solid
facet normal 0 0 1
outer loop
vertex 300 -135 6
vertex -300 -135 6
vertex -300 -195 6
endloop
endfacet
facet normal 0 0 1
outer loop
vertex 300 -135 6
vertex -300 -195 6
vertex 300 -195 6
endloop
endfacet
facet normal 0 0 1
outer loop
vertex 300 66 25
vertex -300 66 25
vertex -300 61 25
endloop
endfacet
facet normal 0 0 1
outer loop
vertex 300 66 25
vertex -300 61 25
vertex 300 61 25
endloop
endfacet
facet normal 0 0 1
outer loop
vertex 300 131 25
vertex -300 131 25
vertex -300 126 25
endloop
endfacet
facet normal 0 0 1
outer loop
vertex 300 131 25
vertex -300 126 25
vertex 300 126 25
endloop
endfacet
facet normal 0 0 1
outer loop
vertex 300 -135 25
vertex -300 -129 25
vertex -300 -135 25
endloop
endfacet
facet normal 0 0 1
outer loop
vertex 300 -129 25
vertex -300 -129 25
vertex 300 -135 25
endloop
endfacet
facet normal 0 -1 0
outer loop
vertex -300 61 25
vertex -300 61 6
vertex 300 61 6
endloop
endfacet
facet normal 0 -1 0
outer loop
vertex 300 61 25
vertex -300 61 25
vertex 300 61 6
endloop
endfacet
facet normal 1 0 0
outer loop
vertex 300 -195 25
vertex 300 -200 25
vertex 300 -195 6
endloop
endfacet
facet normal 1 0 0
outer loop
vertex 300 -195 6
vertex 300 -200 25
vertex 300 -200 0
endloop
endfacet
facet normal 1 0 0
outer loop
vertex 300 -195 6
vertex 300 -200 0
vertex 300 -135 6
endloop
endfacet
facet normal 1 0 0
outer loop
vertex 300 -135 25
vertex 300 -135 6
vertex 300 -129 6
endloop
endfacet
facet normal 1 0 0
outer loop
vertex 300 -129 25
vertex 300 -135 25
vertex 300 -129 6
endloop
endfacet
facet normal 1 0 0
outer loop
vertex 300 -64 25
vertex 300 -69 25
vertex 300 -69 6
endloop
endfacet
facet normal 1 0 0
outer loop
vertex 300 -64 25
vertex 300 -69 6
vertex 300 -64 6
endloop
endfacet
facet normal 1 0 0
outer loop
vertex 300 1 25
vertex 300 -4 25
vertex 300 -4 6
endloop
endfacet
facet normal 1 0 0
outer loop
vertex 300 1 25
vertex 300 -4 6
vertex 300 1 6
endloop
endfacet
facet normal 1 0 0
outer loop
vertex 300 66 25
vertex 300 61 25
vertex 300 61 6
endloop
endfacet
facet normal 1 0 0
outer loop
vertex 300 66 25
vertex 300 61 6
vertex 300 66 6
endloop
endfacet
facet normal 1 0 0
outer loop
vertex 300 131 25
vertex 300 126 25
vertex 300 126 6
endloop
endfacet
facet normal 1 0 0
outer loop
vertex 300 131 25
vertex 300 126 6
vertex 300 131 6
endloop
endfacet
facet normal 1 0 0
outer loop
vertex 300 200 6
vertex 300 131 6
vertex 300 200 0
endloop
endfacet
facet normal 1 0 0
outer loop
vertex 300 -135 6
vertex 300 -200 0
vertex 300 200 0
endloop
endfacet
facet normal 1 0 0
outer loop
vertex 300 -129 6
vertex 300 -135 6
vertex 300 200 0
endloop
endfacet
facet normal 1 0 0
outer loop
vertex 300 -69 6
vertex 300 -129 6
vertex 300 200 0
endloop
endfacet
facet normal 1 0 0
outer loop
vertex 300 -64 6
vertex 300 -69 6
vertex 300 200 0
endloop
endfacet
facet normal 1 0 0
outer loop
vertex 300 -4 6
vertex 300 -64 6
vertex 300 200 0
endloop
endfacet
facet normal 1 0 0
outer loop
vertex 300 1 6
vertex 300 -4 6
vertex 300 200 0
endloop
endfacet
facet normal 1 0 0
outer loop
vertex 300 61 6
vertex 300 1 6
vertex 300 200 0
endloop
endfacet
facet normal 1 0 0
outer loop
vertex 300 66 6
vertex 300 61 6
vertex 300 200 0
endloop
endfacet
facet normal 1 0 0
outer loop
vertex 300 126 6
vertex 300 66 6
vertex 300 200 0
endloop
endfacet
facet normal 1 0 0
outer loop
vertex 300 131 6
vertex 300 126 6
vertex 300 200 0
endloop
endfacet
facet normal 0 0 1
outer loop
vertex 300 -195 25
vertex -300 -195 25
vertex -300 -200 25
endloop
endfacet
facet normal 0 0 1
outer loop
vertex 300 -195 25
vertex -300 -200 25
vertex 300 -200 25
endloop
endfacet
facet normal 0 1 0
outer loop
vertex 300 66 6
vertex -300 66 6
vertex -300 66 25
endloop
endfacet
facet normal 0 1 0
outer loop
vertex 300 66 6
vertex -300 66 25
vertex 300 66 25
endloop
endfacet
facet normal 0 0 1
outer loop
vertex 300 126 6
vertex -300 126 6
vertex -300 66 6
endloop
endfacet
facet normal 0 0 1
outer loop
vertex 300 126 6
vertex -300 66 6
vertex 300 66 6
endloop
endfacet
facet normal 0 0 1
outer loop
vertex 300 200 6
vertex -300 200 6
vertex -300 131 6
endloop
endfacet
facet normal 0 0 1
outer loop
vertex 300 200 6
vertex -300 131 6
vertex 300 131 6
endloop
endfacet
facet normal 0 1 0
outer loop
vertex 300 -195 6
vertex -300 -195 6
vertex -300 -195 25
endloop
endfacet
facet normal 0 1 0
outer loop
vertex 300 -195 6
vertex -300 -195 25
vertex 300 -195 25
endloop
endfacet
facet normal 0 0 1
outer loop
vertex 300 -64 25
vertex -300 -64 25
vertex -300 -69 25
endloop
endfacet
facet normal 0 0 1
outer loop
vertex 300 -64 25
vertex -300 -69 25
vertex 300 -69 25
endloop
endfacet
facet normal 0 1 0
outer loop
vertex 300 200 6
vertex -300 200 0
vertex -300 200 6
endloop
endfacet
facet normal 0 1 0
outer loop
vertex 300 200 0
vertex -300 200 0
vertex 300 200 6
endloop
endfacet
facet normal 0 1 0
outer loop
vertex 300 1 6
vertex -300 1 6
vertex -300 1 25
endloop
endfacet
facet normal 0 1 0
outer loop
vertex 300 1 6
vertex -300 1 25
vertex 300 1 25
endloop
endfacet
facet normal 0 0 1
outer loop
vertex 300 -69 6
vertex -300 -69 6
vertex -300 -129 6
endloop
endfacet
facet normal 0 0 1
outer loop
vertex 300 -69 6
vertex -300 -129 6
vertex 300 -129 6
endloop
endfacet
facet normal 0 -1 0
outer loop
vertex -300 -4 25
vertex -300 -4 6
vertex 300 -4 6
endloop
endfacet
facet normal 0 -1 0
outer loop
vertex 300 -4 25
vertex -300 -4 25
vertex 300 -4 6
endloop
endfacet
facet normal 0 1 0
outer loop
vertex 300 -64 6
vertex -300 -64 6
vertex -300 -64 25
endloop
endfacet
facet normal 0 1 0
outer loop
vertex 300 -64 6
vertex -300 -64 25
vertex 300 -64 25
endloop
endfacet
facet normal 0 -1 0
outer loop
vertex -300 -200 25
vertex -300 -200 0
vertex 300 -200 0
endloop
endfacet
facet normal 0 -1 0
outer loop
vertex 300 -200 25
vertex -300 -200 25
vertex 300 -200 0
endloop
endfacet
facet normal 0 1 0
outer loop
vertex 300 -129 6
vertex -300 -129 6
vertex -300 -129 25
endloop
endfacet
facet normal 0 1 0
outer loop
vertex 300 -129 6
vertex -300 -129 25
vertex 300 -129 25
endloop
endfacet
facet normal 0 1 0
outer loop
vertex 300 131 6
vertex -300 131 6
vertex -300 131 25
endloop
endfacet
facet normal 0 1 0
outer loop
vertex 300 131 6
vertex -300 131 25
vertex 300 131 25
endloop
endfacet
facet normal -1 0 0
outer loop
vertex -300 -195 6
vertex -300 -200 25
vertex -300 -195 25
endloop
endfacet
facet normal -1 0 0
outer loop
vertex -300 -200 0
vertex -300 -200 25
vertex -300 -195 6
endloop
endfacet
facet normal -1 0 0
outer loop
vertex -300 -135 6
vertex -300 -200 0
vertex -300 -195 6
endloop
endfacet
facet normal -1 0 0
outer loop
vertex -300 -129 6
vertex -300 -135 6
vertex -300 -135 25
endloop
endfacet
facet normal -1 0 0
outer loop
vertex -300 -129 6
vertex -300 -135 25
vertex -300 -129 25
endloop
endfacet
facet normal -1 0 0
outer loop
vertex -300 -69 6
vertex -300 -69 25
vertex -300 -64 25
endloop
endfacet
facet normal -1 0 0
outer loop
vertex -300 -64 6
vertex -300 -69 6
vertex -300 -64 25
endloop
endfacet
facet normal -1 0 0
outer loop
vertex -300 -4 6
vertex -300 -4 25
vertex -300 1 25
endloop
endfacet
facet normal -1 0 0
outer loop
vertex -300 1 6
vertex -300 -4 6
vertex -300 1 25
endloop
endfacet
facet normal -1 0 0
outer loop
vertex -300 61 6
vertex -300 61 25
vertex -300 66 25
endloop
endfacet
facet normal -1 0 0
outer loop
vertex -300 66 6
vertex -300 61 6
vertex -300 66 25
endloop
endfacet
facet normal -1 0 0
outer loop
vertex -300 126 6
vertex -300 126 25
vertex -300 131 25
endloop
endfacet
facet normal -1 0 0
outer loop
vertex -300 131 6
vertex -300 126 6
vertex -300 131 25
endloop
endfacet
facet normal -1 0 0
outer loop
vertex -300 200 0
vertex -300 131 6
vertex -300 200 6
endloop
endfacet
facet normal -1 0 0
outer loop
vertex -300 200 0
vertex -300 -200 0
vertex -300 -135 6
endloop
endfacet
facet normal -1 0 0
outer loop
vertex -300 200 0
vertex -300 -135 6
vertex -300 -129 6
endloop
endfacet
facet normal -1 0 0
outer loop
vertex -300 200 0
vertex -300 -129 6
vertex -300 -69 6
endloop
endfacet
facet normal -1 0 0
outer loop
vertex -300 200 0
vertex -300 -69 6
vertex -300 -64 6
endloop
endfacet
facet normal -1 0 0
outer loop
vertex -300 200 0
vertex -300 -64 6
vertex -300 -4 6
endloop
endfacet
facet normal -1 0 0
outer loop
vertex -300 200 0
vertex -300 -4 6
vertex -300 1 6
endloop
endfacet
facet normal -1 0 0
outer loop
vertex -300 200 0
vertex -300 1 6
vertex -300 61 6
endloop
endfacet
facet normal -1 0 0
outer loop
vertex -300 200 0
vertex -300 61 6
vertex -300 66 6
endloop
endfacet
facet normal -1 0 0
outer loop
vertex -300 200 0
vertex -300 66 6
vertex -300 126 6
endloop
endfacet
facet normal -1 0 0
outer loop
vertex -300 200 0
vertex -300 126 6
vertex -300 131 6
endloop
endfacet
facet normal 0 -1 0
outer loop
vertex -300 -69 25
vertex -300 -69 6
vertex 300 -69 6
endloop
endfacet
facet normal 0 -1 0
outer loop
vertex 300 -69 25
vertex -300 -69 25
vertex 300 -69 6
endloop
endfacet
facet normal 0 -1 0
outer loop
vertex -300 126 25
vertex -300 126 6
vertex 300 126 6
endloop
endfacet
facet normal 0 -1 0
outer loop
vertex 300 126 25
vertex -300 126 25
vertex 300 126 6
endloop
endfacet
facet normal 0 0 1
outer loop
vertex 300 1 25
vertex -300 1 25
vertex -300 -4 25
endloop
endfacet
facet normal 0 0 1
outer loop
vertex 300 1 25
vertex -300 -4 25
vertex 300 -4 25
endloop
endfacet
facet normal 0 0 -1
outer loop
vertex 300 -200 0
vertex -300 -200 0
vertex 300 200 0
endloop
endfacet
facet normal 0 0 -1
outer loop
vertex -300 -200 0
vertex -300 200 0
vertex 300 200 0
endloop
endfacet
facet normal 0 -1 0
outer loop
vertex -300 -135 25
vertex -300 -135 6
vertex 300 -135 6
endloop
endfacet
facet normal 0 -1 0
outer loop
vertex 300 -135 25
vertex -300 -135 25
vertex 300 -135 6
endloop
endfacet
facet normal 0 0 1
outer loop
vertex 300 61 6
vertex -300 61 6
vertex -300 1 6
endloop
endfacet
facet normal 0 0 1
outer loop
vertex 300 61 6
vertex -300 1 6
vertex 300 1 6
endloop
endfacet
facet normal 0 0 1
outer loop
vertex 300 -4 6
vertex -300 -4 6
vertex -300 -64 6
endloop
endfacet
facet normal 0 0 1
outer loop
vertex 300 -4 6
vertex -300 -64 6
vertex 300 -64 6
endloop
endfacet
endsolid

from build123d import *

# Parameters (mm, degrees)
F0_W     = 600
F0_H     = 400
F1_DEPTH = 6
F2_W     = 600
F2_H     = 6
F2_H_2   = 5
F3_DEPTH = 25


with BuildPart() as f1:
    # F0 (on Top) → F1 (new body)
    with BuildSketch(Plane.XY):
        Rectangle(F0_W, F0_H)
    extrude(amount=F1_DEPTH)

    # F2 (on Top) → F3 (join)
    with BuildSketch(Plane.XY):
        with Locations((0, -132)):
            Rectangle(F2_W, F2_H)
        with Locations((0, -66.5)):
            Rectangle(F2_W, F2_H_2)
        with Locations((0, -1.5)):
            Rectangle(F2_W, F2_H_2)
        with Locations((0, 63.5)):
            Rectangle(F2_W, F2_H_2)
        with Locations((0, 128.5)):
            Rectangle(F2_W, F2_H_2)
        with Locations((0, -197.5)):
            Rectangle(F2_W, F2_H_2)
    extrude(amount=F3_DEPTH)


solid = f1.part
